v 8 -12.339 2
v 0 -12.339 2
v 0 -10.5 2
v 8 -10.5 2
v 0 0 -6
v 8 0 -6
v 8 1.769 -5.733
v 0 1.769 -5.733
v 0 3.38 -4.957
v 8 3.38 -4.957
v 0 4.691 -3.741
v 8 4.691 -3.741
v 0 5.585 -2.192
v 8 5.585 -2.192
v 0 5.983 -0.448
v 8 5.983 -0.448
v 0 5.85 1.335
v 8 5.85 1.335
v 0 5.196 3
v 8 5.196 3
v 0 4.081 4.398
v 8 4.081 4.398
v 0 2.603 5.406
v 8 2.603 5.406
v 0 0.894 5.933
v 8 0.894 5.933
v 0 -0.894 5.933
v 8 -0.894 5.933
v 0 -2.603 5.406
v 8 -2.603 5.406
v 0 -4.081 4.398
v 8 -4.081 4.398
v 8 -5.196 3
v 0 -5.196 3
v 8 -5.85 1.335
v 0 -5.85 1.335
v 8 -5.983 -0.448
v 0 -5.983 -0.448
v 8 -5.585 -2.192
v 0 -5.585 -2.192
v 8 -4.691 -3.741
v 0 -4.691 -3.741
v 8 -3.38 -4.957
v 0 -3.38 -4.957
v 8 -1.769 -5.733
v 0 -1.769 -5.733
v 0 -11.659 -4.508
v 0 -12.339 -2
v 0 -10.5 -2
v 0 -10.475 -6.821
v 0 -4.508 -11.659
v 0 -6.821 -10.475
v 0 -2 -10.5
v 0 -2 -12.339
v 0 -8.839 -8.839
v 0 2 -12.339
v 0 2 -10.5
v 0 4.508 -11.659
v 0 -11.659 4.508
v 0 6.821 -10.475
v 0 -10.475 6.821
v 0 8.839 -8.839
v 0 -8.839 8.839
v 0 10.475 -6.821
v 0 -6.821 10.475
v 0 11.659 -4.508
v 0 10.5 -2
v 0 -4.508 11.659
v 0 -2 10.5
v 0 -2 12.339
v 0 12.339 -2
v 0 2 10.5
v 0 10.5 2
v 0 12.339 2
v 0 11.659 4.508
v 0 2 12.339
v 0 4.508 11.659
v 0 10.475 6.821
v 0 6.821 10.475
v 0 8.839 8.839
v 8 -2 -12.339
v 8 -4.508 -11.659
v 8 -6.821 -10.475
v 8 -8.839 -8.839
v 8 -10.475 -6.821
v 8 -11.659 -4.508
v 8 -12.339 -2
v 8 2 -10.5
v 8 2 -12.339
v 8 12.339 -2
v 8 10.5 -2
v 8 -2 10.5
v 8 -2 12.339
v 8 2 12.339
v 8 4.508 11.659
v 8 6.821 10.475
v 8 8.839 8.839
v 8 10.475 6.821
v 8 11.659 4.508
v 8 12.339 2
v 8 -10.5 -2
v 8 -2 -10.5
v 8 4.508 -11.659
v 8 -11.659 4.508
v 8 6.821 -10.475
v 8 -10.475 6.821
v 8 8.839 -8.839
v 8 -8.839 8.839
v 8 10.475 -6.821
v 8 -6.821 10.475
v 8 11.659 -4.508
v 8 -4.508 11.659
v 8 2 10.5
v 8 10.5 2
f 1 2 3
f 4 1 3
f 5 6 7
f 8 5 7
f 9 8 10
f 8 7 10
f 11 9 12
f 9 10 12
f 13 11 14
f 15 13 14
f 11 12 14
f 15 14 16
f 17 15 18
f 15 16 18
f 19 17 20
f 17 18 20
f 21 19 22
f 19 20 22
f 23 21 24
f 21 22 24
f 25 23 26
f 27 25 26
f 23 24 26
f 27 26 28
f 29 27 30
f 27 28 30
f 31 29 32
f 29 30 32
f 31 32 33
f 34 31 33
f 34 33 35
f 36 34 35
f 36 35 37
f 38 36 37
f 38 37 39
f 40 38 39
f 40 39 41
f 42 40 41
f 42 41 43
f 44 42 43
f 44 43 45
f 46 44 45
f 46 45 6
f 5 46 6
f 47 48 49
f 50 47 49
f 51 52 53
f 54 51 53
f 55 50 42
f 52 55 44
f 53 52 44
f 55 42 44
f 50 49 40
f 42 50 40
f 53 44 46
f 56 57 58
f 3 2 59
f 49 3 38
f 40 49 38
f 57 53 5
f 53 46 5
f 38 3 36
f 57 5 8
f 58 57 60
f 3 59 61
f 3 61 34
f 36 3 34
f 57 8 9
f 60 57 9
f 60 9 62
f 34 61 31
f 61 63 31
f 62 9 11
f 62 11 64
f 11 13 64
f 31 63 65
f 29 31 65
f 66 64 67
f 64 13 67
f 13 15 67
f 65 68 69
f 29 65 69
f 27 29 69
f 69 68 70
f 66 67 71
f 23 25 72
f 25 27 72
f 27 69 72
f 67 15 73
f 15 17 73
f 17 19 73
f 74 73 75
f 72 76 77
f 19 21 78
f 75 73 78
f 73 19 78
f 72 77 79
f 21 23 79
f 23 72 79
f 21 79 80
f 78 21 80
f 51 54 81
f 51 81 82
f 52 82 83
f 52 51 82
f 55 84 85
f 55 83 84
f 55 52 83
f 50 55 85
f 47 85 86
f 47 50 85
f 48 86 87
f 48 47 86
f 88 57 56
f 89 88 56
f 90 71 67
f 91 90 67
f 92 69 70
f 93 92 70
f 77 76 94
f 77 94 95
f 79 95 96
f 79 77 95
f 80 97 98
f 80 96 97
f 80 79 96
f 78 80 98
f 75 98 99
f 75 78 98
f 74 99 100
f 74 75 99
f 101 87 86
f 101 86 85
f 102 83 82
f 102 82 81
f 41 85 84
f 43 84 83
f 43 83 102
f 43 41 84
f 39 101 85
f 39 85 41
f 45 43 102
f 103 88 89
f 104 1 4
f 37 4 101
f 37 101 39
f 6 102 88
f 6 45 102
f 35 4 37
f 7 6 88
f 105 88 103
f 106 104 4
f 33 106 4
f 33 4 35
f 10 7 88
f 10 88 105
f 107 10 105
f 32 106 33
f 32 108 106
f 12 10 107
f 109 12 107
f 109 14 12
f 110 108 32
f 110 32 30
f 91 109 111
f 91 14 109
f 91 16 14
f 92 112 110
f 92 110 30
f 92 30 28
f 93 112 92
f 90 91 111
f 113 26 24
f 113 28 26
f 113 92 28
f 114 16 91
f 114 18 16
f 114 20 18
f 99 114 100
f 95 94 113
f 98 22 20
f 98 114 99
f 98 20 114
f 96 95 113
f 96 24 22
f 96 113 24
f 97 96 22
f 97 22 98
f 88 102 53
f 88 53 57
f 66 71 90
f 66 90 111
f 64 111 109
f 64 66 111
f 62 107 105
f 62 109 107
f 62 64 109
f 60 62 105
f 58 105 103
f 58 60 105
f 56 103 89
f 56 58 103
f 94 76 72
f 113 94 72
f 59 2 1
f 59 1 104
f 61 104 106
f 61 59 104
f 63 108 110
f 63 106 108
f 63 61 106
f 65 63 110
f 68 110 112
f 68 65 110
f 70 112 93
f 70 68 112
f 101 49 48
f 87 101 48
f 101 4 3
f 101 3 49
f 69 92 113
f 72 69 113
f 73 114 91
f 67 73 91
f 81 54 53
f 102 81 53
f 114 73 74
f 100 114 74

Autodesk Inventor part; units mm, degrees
ref_plane "YZ Plane" through (0, 0, 0) normal (1, 0, 0) x (0, 1, 0)
ref_plane "XZ Plane" through (0, 0, 0) normal (0, 1, 0) x (-1, 0, 0)
sketch "Sketch1" plane through (0, 0, 0) normal (1, 0, 0) x (0, 1, 0)
  circle A0 centre (0, 0) radius 12.5
  dimension "d0" = 25
extrude "Extrusion1" add sketch "Sketch1" along normal blind 8
sketch "Sketch2" plane through (8, 0, 0) normal (1, 0, 0) x (0, 0, -1)
  circle A0 centre (0, 0) radius 6
  dimension "d3" = 12
extrude "Extrusion2" cut sketch "Sketch2" against normal blind 8
thread "Thread1" size "M12x1.75" class "6H" standard "ISO Metric profile" length 13
sketch "Sketch3" plane through (8, 0, 0) normal (1, 0, 0) x (0, 0, -1)
  circle A0 centre (0, 0) radius 12.5 projected
  line L0 (0, 12.5) -> (0, 10.5)
  line L1 (0, 10.5) -> (-2, 10.5)
  line L2 (-2, 10.5) -> (2, 10.5)
  line L3 (-2, 10.5) -> (-2, 12.339)
  line L4 (-2, 13.4004) -> (2, 13.4004)
  line L5 (2, 13.4004) -> (2, 10.5)
  line L6 (-2, 12.339) -> (-2, 13.4004)
  line L7 (-12.5, 0) -> (-10.5, 0)
  line L8 (-10.5, 0) -> (-10.5, -2)
  line L9 (-10.5, -2) -> (-10.5, 2)
  line L10 (-10.5, -2) -> (-12.339, -2)
  line L11 (-13.4004, -2) -> (-13.4004, 2)
  line L12 (-13.4004, 2) -> (-10.5, 2)
  line L13 (-12.339, -2) -> (-13.4004, -2)
  line L14 (0, -12.5) -> (0, -10.5)
  line L15 (0, -10.5) -> (2, -10.5)
  line L16 (2, -10.5) -> (-2, -10.5)
  line L17 (2, -10.5) -> (2, -12.339)
  line L18 (2, -13.4004) -> (-2, -13.4004)
  line L19 (-2, -13.4004) -> (-2, -10.5)
  line L20 (2, -12.339) -> (2, -13.4004)
  line L21 (12.5, 0) -> (10.5, 0)
  line L22 (10.5, 0) -> (10.5, 2)
  line L23 (10.5, 2) -> (10.5, -2)
  line L24 (10.5, 2) -> (12.339, 2)
  line L25 (13.4004, 2) -> (13.4004, -2)
  line L26 (13.4004, -2) -> (10.5, -2)
  line L27 (12.339, 2) -> (13.4004, 2)
  dimension "d9" = 2
  dimension "d10" = 4
  dimension "d16" = 360
extrude "Extrusion3" cut sketch "Sketch3" against normal blind 8 contours L21 L22 L24 A0 | A0 L27 L25 L26 | A0 L26 L23 L21 | L5 L2 L0 A0 | A0 L6 L4 L5 | L20 L18 L19 A0 | A0 L14 L15 L17 | L0 L1 L3 A0 | A0 L19 L16 L14 | L12 L9 L7 A0 | A0 L13 L11 L12 | A0 L7 L8 L10
ref_plane "Work Plane1" through (0, 0, 0) normal (0, 0, 1) x (1, 0, 0)
properties part number "7. LockNutM12" material "Lead"
